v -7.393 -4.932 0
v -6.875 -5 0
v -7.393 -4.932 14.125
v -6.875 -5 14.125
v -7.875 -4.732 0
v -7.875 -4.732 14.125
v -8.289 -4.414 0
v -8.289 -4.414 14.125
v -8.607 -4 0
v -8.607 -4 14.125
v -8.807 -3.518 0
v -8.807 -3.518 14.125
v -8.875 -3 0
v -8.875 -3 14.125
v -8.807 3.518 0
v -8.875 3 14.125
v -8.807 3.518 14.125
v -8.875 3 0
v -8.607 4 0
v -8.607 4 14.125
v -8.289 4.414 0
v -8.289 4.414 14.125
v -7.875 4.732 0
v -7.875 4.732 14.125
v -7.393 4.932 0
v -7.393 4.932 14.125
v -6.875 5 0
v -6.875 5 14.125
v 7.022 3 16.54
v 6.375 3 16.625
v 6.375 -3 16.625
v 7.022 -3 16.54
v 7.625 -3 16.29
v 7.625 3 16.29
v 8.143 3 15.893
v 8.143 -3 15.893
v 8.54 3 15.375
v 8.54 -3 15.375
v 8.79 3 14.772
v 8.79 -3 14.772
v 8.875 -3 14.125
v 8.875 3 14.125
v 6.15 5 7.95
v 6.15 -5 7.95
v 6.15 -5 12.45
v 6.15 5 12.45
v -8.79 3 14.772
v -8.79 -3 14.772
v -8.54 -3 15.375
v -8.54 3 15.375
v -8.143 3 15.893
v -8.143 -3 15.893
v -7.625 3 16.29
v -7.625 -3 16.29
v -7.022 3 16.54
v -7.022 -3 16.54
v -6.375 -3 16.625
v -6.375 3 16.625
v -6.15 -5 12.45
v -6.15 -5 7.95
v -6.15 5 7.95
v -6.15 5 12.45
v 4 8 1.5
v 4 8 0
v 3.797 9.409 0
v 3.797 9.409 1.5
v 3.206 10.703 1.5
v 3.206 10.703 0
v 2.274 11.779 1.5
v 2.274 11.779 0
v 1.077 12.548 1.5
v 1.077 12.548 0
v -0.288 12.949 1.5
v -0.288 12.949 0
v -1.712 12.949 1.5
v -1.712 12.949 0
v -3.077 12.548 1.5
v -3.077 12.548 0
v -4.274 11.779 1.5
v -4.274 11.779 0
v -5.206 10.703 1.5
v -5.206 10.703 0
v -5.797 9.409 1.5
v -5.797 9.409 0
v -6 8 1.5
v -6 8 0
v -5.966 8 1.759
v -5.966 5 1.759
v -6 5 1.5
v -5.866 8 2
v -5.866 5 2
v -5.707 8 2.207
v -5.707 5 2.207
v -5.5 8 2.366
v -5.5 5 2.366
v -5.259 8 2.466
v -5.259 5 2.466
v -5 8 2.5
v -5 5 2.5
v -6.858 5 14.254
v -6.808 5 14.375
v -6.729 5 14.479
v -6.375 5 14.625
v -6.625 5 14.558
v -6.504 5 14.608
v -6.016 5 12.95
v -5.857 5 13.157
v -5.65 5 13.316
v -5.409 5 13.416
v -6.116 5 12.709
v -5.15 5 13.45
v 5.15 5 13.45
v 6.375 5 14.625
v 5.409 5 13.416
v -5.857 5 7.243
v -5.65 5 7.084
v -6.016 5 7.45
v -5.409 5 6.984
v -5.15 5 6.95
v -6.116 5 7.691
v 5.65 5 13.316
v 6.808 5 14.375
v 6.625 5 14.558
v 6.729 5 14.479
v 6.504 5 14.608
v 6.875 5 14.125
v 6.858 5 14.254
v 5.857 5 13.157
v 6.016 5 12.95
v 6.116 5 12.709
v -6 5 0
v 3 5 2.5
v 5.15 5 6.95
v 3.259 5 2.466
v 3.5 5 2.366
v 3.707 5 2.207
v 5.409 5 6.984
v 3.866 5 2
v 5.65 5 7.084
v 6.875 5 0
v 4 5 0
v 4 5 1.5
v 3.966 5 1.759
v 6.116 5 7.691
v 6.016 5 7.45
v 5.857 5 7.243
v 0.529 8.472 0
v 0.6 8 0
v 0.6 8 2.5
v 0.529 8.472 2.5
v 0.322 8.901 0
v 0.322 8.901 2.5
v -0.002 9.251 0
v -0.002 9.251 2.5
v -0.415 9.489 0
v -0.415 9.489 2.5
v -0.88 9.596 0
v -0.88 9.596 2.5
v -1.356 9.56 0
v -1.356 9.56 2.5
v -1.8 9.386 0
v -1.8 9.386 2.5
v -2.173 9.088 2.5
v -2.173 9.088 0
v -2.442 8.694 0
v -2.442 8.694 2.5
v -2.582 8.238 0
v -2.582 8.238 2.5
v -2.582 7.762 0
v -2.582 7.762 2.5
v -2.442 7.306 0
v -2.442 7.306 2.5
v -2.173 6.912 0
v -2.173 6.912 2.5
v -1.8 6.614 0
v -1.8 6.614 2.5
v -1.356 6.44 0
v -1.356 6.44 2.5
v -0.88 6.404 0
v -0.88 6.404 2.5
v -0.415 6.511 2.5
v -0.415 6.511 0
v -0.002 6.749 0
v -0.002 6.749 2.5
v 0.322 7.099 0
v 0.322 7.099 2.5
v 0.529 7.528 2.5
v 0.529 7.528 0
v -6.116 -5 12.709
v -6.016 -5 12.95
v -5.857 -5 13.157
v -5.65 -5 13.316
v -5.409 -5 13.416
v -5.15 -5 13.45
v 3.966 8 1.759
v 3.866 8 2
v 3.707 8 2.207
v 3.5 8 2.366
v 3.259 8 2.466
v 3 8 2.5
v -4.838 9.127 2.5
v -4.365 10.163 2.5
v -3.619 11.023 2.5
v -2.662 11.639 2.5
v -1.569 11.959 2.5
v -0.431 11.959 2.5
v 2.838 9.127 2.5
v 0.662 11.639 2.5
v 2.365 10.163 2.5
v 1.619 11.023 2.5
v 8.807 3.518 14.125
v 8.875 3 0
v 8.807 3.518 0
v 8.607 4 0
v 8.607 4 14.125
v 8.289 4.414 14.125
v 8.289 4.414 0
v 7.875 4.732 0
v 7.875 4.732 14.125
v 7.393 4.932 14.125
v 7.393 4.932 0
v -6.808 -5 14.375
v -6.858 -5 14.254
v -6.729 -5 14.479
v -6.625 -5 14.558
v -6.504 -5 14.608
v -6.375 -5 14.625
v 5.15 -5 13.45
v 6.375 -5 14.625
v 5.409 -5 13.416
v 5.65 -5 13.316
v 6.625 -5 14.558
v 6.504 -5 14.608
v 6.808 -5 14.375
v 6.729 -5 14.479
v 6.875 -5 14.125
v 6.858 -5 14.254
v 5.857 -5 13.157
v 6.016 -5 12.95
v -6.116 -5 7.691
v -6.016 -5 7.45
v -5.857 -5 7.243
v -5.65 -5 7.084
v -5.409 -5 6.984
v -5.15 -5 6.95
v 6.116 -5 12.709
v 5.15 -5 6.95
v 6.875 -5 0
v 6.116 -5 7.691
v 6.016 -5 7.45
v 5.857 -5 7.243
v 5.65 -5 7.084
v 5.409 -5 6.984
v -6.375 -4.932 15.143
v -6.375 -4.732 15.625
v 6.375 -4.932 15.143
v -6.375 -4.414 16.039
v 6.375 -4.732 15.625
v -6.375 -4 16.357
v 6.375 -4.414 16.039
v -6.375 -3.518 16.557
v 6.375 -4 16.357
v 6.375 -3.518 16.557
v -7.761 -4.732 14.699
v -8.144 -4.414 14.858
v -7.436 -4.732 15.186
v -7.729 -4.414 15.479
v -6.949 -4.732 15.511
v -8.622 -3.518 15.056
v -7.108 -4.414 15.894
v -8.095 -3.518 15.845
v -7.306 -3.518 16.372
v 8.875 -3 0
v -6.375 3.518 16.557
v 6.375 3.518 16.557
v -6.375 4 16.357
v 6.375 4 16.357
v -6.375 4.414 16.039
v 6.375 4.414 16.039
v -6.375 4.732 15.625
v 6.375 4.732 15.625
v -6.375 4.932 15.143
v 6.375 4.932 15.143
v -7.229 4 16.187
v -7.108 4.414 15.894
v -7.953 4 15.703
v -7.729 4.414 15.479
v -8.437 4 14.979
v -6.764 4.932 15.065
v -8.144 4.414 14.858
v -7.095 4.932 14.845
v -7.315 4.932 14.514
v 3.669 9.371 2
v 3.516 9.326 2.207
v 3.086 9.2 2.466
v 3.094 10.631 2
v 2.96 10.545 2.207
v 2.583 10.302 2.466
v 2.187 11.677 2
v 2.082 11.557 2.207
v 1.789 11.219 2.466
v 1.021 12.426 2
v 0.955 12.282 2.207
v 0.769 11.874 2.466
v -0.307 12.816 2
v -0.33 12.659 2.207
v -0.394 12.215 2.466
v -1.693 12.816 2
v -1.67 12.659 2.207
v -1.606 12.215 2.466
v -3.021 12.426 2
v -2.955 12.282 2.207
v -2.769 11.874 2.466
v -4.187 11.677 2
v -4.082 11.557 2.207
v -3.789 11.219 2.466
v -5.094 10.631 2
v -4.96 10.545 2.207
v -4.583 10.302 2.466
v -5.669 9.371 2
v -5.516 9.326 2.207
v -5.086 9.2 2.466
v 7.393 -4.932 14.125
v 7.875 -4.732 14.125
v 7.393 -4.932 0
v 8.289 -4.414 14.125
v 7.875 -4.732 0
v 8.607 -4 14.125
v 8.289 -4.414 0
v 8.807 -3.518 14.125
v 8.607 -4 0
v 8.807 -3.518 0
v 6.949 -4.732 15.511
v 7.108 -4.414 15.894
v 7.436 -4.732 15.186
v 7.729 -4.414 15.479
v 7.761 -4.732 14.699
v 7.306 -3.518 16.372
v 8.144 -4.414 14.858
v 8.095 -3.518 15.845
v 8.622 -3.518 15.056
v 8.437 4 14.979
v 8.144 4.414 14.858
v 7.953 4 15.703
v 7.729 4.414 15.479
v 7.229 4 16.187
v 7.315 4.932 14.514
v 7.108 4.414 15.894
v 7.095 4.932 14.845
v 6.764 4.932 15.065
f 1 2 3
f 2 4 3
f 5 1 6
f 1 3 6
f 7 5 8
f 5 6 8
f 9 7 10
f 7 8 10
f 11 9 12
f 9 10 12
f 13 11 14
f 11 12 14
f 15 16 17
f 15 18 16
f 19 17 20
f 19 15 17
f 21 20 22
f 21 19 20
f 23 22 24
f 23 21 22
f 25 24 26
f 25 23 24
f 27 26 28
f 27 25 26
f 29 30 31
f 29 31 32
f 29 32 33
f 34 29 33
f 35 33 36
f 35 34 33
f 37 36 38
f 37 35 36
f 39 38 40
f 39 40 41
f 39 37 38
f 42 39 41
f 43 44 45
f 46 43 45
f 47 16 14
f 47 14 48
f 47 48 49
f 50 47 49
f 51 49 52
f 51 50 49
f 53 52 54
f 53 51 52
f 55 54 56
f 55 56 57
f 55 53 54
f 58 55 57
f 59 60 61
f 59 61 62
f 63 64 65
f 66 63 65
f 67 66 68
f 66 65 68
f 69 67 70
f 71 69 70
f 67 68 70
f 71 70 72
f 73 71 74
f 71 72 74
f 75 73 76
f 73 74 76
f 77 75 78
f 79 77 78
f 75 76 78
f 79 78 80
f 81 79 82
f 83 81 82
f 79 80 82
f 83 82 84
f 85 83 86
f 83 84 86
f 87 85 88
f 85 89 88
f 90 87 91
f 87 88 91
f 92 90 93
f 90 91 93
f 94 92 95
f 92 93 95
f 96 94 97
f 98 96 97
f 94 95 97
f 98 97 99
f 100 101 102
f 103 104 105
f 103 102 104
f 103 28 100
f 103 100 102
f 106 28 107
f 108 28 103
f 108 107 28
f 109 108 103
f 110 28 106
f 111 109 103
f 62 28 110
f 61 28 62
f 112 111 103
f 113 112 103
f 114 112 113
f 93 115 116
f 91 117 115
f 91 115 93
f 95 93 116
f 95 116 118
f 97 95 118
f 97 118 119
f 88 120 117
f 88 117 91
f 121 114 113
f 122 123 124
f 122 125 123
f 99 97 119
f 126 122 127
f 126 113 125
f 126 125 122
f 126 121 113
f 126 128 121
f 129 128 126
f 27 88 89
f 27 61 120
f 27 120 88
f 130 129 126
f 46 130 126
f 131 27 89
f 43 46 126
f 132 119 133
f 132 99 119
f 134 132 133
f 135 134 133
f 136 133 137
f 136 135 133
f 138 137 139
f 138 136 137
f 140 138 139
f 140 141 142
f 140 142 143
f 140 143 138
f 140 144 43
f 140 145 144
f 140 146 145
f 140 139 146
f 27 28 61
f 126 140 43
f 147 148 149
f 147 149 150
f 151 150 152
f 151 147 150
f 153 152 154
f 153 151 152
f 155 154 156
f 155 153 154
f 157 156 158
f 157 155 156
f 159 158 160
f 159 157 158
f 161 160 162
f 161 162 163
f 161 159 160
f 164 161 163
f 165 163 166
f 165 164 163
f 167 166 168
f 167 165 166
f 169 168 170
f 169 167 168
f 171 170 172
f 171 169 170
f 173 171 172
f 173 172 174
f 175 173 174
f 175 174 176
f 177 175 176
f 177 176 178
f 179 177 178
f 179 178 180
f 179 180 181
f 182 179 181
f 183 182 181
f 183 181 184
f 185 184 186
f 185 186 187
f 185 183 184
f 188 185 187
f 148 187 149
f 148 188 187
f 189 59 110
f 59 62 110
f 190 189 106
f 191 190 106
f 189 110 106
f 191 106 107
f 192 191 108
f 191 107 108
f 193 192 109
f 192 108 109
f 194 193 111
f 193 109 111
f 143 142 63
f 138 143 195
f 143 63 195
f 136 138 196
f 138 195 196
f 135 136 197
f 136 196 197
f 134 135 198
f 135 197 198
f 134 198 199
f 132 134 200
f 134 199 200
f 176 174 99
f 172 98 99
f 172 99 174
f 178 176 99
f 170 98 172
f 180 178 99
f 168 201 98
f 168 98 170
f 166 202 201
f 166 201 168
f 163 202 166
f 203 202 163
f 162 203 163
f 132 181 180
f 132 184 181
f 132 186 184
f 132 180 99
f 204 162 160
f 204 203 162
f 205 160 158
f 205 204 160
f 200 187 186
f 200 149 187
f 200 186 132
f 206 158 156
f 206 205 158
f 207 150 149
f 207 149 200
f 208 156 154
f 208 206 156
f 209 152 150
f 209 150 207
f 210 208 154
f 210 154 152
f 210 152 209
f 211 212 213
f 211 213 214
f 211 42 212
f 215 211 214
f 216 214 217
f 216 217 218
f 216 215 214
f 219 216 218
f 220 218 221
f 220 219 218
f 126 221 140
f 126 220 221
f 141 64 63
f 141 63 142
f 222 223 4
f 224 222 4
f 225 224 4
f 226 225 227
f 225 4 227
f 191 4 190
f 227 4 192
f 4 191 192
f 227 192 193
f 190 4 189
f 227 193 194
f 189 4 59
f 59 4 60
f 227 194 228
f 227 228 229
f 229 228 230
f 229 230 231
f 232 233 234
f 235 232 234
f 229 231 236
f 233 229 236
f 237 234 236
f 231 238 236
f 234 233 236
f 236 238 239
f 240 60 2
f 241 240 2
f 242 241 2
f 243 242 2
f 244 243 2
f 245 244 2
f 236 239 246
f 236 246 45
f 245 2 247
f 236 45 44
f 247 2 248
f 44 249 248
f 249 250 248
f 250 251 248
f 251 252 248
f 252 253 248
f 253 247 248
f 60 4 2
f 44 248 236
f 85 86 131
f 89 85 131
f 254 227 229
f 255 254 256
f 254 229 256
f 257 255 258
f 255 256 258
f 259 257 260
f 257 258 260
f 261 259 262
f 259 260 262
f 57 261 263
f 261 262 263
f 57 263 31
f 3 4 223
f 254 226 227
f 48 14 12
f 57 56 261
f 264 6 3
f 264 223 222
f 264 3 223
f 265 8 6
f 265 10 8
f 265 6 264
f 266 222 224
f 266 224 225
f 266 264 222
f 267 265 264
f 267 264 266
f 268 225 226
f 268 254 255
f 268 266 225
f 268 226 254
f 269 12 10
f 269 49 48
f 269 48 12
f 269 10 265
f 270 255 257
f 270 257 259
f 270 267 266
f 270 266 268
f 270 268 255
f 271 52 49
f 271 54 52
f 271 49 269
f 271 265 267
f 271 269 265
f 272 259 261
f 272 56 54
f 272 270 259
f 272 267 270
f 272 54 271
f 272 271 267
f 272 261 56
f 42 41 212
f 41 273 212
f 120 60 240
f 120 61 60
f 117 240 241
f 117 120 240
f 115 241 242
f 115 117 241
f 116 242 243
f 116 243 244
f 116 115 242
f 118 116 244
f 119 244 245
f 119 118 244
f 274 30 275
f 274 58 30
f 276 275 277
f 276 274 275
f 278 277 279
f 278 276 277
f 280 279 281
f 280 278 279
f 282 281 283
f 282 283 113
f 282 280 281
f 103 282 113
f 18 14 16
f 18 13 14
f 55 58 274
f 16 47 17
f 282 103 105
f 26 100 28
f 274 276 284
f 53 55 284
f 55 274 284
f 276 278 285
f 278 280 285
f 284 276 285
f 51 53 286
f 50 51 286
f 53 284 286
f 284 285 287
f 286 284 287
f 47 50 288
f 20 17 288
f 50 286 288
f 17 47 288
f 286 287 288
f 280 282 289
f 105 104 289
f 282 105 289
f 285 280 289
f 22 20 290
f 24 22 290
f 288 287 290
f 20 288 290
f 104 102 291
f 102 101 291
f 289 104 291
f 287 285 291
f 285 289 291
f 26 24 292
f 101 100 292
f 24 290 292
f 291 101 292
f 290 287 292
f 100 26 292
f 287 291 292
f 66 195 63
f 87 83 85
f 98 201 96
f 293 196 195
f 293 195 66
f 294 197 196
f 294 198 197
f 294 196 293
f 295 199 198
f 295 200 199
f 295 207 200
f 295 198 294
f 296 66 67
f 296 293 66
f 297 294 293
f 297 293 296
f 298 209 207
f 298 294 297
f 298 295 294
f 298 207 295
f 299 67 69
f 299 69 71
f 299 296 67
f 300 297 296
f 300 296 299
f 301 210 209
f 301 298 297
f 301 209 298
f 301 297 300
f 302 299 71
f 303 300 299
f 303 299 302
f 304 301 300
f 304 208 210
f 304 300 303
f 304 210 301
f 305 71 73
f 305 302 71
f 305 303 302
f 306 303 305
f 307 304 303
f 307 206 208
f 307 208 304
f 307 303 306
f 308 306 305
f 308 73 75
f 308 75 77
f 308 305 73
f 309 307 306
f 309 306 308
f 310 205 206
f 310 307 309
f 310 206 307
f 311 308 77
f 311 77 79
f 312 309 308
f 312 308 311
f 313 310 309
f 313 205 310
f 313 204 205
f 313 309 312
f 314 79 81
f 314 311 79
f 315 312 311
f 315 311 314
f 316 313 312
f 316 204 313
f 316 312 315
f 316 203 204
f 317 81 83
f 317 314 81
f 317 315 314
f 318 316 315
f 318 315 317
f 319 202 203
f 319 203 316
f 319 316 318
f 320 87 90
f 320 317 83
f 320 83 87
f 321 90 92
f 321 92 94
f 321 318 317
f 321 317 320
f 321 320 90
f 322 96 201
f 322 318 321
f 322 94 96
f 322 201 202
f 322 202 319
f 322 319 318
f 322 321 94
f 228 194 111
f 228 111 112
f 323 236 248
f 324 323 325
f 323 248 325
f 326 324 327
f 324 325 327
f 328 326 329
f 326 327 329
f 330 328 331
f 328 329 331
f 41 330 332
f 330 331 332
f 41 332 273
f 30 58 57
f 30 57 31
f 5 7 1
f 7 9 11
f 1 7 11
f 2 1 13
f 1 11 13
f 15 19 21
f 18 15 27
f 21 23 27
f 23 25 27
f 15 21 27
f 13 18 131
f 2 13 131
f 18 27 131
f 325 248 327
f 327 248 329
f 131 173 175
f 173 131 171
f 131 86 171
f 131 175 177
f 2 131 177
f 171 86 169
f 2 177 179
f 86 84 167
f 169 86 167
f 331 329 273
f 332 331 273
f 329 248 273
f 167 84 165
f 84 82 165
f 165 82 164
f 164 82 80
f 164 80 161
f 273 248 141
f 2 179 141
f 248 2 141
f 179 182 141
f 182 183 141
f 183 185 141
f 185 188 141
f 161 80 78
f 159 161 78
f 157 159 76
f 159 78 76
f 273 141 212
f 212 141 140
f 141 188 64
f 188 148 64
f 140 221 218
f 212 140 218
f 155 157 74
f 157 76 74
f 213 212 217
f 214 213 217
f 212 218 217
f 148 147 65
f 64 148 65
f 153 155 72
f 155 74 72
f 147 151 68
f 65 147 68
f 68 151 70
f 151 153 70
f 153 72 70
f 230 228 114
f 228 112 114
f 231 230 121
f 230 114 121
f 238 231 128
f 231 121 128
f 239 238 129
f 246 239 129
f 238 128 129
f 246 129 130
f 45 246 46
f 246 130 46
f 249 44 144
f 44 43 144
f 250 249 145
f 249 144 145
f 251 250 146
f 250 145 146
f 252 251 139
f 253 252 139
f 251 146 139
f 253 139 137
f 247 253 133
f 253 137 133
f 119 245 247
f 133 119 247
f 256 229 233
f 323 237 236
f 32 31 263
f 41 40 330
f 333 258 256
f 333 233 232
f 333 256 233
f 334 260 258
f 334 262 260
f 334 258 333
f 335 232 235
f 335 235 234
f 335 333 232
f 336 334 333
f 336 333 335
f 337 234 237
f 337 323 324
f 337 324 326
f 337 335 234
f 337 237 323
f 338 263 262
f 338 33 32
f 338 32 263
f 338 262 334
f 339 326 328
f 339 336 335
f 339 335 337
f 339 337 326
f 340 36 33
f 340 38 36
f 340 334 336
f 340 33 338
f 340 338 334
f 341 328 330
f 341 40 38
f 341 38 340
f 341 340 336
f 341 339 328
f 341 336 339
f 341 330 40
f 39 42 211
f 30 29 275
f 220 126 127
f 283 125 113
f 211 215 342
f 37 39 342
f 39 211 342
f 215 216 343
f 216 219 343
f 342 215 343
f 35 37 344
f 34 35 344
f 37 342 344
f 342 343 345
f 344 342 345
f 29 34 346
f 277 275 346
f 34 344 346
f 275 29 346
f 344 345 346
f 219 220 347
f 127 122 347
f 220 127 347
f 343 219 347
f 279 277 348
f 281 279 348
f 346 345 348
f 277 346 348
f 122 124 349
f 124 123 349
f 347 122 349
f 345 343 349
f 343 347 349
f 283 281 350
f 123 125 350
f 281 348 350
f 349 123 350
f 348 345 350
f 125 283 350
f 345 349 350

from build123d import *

# Parameters (mm, degrees)
SKETCH042_W     = 17.75
SKETCH042_H     = 10
PAD023_DEPTH    = 16.625
SKETCH043_W     = 12.3
SKETCH043_H     = 6.5
POCKET020_DEPTH = 10
FILLET013_R     = 1
FILLET014_R     = 2.5
FILLET015_R     = 2
FILLET016_R     = 2
SKETCH044_R     = 1.6
PAD024_DEPTH    = 2.5
FILLET017_R     = 1


with BuildPart() as part:
    # Sketch042 → Pad023 (new body)
    with BuildSketch(Plane.XY):
        Rectangle(SKETCH042_W, SKETCH042_H)
    extrude(amount=PAD023_DEPTH)

    # Sketch043 (on Face3 of Pad023) → Pocket020 (cut)
    with BuildSketch(Plane.XZ.offset(5)):
        with Locations((0, 10.2)):
            Rectangle(SKETCH043_W, SKETCH043_H)
    extrude(amount=-POCKET020_DEPTH, mode=Mode.SUBTRACT)

    # Fillet013
    fillet013_edges = [part.edges().sort_by_distance(p)[0] for p in [
        (-6.15, 0, 13.45),
        (6.15, 0, 13.45),
        (6.15, 0, 6.95),
        (-6.15, 0, 6.95),
    ]]
    fillet(fillet013_edges, radius=FILLET013_R)

    # Fillet014
    fillet014_edges = [part.edges().sort_by_distance(p)[0] for p in [
        (8.875, 0, 16.625),
        (-8.875, 0, 16.625),
    ]]
    fillet(fillet014_edges, radius=FILLET014_R)

    # Fillet015
    fillet015_edges = [part.edges().sort_by_distance(p)[0] for p in [
        (8.875, 5, 7.0625),
        (-8.875, 5, 7.0625),
    ]]
    fillet(fillet015_edges, radius=FILLET015_R)

    # Fillet016
    fillet016_edges = [part.edges().sort_by_distance(p)[0] for p in [
        (0, -5, 16.625),
    ]]
    fillet(fillet016_edges, radius=FILLET016_R)

    # Sketch044 → Pad024 (join)
    with BuildSketch(Plane.XY):
        with BuildLine():
            Line((-6, 8), (-6, 0))
            Line((-6, 0), (4, 0))
            Line((4, 8), (4, 0))
            ThreePointArc((4, 8), (-1, 13), (-6, 8))
        make_face()
        with Locations((-1, 8)):
            Circle(SKETCH044_R, mode=Mode.SUBTRACT)
    extrude(amount=PAD024_DEPTH)

    # Fillet017
    fillet017_edges = [part.edges().sort_by_distance(p)[0] for p in [
        (-6, 6.5, 2.5),
        (-1, 13, 2.5),
        (4, 6.5, 2.5),
    ]]
    fillet(fillet017_edges, radius=FILLET017_R)


solid = part.part
